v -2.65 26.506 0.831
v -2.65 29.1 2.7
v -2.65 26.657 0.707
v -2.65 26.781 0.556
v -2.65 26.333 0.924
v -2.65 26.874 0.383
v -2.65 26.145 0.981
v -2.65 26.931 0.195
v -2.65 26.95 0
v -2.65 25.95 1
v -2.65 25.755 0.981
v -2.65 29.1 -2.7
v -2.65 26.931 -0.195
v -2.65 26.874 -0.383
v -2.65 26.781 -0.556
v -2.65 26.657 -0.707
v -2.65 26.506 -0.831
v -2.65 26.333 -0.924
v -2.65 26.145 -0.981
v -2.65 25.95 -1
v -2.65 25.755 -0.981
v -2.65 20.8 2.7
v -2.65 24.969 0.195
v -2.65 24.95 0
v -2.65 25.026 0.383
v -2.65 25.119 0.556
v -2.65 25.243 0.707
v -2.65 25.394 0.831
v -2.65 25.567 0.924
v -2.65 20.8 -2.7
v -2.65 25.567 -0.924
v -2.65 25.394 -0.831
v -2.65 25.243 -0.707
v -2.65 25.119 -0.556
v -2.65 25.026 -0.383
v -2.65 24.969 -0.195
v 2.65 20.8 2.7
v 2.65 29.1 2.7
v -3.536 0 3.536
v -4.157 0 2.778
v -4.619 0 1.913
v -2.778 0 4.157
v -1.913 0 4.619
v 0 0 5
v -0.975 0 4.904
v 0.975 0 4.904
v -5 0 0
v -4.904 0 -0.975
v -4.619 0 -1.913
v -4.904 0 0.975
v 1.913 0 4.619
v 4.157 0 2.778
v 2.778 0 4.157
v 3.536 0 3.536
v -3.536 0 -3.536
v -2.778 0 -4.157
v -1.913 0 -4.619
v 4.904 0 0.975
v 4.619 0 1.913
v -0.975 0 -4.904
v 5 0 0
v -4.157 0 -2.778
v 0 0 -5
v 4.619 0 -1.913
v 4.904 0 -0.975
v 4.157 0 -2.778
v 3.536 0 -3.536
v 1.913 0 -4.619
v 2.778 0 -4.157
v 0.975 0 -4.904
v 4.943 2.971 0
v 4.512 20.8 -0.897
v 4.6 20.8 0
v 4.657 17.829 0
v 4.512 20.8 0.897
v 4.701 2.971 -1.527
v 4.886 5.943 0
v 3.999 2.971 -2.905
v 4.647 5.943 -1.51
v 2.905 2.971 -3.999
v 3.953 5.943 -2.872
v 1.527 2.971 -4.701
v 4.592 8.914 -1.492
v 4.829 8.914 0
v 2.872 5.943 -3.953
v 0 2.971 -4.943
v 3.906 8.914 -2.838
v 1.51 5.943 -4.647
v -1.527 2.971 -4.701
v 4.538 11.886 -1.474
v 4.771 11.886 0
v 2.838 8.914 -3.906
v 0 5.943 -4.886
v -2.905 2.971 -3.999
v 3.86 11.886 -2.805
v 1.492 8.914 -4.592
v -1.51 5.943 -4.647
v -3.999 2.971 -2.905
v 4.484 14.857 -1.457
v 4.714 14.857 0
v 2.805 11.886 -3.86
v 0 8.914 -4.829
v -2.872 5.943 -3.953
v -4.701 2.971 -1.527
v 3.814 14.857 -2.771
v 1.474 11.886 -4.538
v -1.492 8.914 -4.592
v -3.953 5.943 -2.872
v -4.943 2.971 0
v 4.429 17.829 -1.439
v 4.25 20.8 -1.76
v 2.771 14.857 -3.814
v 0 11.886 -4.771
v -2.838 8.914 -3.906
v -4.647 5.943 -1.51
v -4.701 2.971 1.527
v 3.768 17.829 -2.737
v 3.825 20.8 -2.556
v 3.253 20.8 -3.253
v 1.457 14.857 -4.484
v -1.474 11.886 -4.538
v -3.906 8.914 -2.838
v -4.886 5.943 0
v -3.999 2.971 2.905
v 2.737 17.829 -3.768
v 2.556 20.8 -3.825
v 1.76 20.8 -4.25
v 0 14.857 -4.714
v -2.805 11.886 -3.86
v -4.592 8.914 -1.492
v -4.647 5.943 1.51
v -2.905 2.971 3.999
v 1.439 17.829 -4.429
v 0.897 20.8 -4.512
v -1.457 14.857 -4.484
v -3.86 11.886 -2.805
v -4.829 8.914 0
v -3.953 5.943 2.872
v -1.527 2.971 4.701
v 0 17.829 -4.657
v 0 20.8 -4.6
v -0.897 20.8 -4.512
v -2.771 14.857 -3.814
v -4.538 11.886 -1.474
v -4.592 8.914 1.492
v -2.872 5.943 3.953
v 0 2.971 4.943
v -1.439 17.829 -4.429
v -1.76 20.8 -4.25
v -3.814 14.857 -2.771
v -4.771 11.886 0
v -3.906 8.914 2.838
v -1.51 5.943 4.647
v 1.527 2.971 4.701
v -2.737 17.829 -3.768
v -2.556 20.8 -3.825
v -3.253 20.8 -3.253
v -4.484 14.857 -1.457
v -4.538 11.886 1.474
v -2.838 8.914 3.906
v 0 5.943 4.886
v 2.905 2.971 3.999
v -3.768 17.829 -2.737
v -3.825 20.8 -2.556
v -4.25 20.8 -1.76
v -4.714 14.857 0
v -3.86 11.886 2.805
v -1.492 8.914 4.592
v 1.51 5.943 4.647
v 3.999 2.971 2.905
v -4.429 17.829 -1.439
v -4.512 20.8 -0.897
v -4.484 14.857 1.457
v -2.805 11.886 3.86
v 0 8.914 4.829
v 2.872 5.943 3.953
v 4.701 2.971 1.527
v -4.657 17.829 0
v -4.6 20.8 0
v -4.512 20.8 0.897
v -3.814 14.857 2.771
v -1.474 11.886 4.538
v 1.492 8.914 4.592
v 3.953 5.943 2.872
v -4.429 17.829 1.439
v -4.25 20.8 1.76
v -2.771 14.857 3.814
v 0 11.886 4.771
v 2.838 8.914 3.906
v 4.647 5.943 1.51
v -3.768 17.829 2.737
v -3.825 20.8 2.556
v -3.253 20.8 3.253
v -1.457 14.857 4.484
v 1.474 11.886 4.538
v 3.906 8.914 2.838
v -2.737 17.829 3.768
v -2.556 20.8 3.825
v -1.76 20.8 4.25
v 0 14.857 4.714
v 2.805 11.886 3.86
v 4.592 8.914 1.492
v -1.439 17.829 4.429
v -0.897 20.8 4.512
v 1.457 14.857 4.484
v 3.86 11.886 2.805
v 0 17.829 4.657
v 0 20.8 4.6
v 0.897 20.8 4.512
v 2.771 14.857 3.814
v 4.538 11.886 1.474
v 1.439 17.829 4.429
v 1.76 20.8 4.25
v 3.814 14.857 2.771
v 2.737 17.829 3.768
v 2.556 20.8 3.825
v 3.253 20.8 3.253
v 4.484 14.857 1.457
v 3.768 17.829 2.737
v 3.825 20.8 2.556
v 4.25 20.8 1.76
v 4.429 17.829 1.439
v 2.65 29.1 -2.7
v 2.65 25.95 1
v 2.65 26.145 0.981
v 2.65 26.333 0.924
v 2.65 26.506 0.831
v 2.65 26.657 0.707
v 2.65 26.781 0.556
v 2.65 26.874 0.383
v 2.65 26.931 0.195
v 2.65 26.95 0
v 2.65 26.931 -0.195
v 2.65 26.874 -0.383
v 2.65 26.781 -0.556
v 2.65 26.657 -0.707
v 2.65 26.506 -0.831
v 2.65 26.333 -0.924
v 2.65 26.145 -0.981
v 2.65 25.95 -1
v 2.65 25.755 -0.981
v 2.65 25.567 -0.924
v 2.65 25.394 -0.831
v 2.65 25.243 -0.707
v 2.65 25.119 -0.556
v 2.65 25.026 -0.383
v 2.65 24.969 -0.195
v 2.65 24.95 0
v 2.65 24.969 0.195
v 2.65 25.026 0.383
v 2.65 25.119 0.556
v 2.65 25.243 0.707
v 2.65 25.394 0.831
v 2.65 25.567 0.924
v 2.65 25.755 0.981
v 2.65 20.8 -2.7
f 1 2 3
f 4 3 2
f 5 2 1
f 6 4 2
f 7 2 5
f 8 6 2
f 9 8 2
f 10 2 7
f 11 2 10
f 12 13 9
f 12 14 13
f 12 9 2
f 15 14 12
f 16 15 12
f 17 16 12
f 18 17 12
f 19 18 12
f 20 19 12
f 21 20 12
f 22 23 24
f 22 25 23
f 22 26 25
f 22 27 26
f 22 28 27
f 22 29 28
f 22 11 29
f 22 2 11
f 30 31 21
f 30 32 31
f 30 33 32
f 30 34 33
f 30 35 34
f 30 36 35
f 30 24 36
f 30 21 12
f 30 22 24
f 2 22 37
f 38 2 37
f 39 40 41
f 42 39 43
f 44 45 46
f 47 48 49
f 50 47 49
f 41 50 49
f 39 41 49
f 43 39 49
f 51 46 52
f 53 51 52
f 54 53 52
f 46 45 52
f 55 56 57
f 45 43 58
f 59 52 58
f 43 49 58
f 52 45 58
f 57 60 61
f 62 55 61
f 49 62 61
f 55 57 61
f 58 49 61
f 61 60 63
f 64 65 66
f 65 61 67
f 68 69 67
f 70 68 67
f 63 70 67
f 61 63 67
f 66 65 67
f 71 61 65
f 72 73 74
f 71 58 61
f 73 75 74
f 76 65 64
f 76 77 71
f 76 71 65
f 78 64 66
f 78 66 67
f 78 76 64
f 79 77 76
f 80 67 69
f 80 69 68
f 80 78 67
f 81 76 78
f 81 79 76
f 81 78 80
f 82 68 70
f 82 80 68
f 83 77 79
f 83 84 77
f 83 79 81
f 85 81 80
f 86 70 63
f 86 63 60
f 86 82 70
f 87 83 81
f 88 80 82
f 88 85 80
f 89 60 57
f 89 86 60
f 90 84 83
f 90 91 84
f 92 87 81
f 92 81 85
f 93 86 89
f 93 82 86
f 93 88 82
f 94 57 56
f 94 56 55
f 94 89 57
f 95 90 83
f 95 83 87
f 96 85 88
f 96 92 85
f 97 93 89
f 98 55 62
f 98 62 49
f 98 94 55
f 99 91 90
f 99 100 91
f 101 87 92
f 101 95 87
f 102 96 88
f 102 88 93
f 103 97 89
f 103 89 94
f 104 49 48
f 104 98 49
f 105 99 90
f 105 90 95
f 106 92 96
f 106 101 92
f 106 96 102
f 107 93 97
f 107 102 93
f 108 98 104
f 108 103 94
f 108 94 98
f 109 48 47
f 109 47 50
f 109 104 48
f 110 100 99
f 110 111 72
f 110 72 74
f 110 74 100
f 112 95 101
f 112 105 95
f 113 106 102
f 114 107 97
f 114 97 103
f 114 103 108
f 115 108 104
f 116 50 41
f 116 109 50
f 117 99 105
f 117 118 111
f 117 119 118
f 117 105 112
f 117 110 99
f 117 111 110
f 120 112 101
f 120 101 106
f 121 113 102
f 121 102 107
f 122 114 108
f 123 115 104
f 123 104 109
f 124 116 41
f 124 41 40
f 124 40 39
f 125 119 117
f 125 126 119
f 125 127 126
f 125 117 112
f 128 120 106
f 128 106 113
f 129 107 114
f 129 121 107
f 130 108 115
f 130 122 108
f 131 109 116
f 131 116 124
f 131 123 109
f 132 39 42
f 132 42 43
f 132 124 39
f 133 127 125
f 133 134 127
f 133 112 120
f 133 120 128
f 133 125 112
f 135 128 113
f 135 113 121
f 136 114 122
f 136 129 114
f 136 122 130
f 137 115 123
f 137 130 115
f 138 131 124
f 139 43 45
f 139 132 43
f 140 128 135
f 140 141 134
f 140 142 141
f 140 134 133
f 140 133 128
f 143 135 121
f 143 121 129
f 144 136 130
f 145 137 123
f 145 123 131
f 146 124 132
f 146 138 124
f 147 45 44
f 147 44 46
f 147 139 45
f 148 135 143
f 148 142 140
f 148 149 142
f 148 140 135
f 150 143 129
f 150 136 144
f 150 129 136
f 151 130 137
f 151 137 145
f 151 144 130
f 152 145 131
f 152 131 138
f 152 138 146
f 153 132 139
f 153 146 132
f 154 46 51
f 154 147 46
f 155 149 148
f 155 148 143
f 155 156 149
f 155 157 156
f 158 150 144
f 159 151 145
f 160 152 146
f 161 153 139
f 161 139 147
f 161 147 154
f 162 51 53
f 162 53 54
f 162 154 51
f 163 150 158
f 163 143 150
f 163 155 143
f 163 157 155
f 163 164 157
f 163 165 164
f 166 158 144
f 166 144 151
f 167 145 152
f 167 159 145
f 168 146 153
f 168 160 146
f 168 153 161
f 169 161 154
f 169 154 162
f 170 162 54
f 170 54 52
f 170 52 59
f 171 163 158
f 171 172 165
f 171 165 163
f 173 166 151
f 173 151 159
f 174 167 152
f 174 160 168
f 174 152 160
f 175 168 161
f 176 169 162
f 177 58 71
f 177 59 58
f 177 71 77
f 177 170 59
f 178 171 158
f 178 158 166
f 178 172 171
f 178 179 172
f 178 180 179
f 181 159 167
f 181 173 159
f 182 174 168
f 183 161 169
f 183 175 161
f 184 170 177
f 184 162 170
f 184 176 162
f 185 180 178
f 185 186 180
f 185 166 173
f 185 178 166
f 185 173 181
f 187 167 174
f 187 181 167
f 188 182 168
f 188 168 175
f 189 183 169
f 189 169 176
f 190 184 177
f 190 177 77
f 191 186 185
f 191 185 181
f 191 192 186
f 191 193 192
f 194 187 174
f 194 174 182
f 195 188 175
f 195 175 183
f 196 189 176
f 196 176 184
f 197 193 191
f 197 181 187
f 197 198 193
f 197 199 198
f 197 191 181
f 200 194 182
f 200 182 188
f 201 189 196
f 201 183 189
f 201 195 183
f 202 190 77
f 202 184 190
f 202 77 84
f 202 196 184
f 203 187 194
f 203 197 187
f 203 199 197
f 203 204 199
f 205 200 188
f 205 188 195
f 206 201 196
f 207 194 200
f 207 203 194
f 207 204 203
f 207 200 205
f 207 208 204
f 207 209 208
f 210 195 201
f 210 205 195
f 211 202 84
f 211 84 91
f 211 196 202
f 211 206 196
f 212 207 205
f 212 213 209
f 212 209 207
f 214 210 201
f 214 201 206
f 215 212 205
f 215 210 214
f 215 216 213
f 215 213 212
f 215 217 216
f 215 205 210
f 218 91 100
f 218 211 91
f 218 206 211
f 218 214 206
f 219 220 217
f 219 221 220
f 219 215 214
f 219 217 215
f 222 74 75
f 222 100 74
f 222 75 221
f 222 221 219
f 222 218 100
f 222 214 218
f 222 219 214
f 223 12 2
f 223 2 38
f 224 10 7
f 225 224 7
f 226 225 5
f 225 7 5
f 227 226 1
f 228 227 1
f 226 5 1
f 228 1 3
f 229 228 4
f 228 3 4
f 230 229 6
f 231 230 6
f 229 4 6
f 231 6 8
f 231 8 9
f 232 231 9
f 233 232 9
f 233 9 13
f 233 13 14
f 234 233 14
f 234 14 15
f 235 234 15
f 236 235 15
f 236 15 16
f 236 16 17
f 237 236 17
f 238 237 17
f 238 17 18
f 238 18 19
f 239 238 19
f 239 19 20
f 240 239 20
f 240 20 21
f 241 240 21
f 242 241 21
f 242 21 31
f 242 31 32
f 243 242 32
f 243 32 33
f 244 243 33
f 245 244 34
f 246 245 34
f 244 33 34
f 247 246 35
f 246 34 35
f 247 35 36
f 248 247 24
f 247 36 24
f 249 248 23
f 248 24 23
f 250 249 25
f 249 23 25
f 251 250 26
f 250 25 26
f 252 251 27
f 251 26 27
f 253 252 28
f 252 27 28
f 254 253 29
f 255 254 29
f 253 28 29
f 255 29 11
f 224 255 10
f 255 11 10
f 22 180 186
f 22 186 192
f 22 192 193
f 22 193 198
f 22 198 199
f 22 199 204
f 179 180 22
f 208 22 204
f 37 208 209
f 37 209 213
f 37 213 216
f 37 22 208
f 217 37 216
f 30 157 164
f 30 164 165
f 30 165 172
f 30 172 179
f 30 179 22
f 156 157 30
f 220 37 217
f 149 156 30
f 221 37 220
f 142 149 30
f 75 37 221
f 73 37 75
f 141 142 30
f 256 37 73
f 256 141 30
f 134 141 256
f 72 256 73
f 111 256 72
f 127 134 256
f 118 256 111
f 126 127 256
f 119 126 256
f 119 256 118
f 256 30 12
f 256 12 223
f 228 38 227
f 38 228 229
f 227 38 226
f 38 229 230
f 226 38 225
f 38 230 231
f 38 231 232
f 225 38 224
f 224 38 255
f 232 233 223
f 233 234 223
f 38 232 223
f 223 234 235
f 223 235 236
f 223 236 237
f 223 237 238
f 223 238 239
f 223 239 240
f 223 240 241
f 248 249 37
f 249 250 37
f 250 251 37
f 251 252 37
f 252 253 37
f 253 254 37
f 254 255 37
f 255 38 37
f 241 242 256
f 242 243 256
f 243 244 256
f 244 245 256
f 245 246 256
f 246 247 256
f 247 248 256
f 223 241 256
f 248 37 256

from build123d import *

# Parameters (mm, degrees)
SKETCH1_R           = 5
SKETCH2_R           = 4.6
SKETCH3_W           = 5.3
SKETCH3_H           = 5.4
BOSS_EXTRUDE1_DEPTH = 8.3
SKETCH4_R           = 1
CUT_EXTRUDE1_DEPTH  = 31.501352471


with BuildPart() as part:
    # Sketch1 → Loft1 section 0
    with BuildSketch(Plane(origin=(0, 0, 0), x_dir=(1, 0, 0), z_dir=(0, 1, 0))):
        Circle(SKETCH1_R)
    # Sketch2 → Loft1 section 1
    with BuildSketch(Plane(origin=(0, 20.8, 0), x_dir=(1, 0, 0), z_dir=(0, 1, 0))):
        Circle(SKETCH2_R)
    loft()

    # Sketch3 → Boss-Extrude1 (add)
    with BuildSketch(Plane(origin=(0, 20.8, 0), x_dir=(1, 0, 0), z_dir=(0, 1, 0))):
        Rectangle(SKETCH3_W, SKETCH3_H)
    extrude(amount=BOSS_EXTRUDE1_DEPTH)

    # Sketch4 → Cut-Extrude1 (cut, through all)
    with BuildSketch(Plane.ZY.offset(2.65)):
        with Locations((0, 25.95)):
            Circle(SKETCH4_R)
    extrude(amount=-CUT_EXTRUDE1_DEPTH, mode=Mode.SUBTRACT)


solid = part.part
